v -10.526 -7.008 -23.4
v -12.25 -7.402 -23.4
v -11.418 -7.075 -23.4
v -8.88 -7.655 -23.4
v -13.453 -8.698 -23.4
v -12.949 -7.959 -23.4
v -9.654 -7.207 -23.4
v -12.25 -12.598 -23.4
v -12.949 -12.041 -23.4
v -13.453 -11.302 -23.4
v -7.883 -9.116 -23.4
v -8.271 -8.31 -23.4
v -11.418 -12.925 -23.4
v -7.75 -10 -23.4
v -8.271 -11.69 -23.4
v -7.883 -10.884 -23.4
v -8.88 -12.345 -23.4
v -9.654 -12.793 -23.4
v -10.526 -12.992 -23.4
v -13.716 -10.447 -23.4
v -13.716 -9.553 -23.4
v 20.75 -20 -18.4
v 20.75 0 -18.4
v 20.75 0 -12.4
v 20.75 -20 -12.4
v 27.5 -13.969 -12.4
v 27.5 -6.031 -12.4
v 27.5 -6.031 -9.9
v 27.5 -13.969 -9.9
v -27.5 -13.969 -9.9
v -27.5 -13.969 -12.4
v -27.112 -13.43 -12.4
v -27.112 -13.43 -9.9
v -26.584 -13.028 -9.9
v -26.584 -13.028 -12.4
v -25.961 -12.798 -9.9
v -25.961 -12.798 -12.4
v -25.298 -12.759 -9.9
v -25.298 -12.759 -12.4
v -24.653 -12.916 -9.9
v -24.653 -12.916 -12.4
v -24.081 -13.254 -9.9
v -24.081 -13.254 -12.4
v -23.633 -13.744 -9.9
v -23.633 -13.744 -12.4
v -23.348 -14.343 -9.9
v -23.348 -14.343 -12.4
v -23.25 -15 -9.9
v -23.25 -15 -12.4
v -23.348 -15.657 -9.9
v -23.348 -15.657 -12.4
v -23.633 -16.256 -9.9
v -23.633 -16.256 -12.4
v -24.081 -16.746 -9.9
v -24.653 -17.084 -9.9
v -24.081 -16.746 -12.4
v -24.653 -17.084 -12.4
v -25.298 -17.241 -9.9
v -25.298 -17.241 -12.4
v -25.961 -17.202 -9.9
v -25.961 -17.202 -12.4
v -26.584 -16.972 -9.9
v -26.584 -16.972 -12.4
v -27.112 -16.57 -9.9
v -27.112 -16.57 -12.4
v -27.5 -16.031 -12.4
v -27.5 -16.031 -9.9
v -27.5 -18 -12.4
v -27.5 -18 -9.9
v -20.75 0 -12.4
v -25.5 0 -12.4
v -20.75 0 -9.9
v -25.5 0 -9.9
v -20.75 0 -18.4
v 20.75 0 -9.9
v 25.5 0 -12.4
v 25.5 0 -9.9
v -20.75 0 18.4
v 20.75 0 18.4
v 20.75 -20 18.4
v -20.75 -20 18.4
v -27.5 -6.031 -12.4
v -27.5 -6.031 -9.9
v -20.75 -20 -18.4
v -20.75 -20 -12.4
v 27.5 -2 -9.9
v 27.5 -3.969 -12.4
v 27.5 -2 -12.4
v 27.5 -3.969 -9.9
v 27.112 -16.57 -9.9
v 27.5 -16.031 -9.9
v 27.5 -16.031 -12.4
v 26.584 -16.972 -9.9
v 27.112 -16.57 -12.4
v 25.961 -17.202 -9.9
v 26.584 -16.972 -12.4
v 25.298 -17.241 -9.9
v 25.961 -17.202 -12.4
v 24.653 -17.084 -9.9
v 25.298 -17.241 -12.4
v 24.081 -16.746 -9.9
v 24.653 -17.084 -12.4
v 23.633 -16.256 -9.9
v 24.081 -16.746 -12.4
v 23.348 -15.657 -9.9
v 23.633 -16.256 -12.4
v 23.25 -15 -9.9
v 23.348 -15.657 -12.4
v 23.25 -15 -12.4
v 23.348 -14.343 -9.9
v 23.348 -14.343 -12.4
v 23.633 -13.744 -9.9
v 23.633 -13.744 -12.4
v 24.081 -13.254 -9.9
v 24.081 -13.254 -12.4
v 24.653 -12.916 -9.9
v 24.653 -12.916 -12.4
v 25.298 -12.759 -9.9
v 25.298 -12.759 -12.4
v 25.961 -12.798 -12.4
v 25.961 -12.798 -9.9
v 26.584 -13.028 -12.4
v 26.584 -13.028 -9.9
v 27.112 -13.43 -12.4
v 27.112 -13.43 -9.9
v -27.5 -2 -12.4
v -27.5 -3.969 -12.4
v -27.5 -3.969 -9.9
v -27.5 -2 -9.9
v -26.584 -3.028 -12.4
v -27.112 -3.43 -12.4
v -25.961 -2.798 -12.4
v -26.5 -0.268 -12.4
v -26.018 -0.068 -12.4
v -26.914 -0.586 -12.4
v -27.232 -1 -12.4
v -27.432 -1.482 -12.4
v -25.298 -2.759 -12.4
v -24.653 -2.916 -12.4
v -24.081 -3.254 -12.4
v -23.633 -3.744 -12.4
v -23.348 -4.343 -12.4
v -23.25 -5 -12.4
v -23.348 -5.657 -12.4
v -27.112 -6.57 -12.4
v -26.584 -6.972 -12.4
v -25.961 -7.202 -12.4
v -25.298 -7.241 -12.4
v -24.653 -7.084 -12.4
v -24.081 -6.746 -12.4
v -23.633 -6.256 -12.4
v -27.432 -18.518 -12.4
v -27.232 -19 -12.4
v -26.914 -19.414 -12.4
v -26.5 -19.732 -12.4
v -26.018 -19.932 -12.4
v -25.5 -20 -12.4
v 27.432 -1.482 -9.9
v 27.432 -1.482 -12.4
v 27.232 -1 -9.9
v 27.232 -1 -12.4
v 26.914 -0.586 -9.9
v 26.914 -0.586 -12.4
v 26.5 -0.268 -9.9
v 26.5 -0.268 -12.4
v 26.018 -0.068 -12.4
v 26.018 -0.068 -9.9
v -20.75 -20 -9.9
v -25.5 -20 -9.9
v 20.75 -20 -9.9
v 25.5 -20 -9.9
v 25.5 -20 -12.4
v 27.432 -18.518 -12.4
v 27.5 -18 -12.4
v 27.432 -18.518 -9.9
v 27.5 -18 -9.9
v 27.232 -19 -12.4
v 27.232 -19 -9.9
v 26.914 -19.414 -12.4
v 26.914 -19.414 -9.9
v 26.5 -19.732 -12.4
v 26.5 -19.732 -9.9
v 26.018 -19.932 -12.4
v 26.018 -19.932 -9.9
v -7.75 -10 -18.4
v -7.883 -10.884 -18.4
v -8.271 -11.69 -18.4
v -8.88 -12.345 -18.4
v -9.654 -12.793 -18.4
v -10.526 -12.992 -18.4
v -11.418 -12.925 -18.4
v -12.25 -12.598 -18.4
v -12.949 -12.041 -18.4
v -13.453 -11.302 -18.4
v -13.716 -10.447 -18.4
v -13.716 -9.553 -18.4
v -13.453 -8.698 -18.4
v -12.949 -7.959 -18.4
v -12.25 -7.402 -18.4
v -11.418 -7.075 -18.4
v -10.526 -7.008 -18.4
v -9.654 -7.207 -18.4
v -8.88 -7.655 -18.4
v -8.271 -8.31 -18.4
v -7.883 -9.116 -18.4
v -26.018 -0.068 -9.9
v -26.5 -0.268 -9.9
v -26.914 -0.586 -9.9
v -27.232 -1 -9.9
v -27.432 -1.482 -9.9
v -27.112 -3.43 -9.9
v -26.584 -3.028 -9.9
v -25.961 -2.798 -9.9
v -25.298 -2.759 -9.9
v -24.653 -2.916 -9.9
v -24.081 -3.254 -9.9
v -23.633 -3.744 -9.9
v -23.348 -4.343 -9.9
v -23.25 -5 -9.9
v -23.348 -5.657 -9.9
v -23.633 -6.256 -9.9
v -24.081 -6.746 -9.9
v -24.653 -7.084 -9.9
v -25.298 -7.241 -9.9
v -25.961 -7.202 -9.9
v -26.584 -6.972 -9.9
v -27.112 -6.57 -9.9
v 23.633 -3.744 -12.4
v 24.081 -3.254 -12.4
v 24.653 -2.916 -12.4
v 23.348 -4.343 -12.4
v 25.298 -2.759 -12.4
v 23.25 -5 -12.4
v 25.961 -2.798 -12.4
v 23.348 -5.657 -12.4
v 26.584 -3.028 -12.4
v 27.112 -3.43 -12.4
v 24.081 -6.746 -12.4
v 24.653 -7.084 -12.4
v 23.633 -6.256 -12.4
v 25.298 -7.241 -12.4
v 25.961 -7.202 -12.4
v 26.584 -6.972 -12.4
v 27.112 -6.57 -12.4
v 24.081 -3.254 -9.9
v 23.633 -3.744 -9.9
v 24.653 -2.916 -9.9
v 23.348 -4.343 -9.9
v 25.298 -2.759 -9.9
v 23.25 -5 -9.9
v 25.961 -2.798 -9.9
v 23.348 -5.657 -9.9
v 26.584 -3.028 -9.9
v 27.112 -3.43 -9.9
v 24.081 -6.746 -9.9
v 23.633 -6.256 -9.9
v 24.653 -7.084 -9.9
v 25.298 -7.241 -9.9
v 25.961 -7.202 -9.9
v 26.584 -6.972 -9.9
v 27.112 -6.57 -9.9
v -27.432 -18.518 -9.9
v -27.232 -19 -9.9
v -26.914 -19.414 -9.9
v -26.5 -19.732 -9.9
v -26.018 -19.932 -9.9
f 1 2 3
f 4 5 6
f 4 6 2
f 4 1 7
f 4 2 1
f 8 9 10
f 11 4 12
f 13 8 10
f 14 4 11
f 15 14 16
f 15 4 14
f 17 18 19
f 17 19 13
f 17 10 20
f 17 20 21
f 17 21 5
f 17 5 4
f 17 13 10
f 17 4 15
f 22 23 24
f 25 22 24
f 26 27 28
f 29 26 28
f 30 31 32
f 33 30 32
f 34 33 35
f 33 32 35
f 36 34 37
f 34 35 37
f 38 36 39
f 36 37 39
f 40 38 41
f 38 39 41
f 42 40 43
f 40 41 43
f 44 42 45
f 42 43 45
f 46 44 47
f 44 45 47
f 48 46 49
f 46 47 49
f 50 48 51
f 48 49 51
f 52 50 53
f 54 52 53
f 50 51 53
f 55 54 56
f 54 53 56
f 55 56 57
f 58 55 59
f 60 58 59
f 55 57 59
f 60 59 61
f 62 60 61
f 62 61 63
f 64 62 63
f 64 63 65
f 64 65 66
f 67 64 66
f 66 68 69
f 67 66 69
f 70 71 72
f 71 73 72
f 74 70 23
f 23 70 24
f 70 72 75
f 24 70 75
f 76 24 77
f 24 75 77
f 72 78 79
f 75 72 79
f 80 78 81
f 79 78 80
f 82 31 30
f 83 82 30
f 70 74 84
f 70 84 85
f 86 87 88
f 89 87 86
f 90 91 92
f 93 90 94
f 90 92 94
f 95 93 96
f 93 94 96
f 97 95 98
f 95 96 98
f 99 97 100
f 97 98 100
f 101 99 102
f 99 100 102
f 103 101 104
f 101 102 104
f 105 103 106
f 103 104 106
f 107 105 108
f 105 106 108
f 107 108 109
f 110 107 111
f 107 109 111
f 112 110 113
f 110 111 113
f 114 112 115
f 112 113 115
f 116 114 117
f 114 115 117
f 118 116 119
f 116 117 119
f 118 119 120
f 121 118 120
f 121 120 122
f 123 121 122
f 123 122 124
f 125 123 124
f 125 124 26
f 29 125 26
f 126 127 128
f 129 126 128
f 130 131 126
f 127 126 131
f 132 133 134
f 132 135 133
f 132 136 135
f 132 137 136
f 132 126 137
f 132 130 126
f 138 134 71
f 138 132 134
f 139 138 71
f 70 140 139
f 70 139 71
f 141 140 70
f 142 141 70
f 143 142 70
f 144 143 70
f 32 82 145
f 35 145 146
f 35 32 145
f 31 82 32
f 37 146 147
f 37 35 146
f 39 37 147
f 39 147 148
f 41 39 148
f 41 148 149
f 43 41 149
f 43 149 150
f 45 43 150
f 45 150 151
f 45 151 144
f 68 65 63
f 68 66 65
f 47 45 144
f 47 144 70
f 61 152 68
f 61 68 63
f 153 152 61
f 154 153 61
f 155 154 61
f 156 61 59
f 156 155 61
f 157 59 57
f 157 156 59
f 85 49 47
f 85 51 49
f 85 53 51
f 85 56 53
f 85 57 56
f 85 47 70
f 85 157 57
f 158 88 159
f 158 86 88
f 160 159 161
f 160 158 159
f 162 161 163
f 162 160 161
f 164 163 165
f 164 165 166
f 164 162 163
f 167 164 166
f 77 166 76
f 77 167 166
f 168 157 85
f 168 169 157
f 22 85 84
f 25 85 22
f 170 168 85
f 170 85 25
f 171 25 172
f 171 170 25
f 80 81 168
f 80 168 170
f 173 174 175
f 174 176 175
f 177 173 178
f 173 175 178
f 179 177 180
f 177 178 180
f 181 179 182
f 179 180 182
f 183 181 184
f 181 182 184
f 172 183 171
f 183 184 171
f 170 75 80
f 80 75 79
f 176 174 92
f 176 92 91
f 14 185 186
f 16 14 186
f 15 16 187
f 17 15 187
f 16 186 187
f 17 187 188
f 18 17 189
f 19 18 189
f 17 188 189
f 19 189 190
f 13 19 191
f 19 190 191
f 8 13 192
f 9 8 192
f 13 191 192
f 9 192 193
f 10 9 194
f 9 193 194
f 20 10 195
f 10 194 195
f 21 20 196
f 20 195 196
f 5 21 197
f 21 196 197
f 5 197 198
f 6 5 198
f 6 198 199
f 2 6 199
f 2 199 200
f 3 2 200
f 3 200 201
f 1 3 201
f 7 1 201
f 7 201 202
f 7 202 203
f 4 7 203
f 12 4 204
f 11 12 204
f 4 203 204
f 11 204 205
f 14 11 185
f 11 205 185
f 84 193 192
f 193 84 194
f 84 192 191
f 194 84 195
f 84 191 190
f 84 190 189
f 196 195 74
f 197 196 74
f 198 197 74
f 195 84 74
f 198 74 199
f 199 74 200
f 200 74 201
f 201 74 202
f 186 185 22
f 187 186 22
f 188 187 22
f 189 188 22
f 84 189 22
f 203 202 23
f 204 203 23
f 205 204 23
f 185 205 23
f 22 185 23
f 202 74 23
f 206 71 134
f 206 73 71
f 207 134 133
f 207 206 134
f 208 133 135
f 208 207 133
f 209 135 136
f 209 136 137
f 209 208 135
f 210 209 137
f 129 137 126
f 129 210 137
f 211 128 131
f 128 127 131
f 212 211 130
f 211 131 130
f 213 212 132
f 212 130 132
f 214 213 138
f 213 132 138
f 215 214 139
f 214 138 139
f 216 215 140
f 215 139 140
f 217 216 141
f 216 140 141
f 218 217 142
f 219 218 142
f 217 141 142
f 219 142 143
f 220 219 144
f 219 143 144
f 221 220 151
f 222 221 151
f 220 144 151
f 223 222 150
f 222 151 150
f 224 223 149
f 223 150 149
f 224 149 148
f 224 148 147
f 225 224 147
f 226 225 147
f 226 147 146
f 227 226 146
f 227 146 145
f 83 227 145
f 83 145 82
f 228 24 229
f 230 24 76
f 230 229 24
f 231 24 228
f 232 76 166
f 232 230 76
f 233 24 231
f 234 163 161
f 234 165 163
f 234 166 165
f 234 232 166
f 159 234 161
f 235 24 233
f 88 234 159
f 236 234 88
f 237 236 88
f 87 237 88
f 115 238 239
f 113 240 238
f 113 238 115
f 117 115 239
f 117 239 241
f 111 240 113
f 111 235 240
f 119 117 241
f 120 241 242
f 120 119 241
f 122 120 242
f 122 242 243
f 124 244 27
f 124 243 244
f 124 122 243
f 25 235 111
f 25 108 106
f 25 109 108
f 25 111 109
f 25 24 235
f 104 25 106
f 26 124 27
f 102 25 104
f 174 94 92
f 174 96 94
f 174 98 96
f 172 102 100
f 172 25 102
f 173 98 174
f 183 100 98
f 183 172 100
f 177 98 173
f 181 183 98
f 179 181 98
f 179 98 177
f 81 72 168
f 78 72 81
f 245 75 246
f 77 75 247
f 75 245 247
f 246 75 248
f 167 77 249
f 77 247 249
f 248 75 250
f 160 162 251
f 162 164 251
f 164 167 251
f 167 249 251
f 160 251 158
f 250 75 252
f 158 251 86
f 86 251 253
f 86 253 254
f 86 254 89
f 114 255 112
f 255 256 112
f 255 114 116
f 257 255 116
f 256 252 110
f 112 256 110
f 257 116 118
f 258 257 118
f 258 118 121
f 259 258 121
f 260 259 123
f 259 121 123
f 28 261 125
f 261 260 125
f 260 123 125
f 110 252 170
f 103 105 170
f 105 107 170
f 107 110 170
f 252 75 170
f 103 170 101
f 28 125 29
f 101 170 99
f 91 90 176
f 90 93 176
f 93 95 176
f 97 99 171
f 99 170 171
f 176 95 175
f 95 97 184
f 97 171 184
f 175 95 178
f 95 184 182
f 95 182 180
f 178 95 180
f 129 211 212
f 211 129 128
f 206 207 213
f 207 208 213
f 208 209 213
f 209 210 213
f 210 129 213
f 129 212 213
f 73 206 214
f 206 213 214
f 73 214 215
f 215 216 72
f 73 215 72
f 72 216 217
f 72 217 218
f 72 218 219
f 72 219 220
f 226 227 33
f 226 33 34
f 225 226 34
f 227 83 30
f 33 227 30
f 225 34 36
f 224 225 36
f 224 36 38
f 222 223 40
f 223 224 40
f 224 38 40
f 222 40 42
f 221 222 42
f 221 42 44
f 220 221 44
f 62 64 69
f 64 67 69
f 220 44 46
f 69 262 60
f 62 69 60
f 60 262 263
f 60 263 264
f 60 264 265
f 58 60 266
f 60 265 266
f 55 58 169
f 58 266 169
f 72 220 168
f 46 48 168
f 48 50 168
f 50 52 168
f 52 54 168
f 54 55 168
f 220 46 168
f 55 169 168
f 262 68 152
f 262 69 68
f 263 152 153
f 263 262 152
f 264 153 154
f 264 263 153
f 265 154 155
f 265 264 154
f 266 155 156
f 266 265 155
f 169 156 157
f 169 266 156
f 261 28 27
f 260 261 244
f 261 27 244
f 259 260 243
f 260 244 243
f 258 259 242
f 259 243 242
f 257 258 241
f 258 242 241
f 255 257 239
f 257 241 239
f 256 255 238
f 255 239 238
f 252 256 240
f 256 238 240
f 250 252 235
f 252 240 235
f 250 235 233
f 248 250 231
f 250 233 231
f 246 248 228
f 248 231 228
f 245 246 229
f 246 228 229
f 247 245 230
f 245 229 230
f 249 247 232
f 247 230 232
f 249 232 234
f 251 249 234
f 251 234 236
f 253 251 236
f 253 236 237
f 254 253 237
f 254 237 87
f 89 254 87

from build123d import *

# Parameters (mm, degrees)
F0_W     = 41.5
F0_H     = 36.8
F1_DEPTH = 20
F2_W     = 55
F2_H     = 2.5
F3_DEPTH = 20
F4_R     = 3
F5_DEPTH = 5
F6_R     = 2.25
F7_DEPTH = 25
F8_R     = 2


with BuildPart() as f1:
    # F0 (on Front) → F1 (new body)
    with BuildSketch(Plane.XZ):
        Rectangle(F0_W, F0_H)
    extrude(amount=F1_DEPTH)

    # F2 (on face) → F3 (join)
    with BuildSketch(Plane.XZ.offset(20)):
        with Locations((0, -11.15)):
            Rectangle(F2_W, F2_H)
    extrude(amount=-F3_DEPTH)

    # F4 (on face) → F5 (join)
    with BuildSketch(Plane(origin=(0, 0, -18.4), x_dir=(1, 0, 0), z_dir=(0, 0, -1))):
        with Locations((-10.75, 10)):
            Circle(F4_R)
    extrude(amount=F5_DEPTH)

    # F6 (on face) → F7 (cut)
    with BuildSketch(Plane(origin=(0, 0, -12.4), x_dir=(1, 0, 0), z_dir=(0, 0, -1))):
        with Locations((-25.5, 15)):
            Circle(F6_R)
        with Locations((-25.5, 5)):
            Circle(F6_R)
        with Locations((25.5, 15)):
            Circle(F6_R)
        with Locations((25.5, 5)):
            Circle(F6_R)
    extrude(amount=-F7_DEPTH, mode=Mode.SUBTRACT)

    # F8
    f8_edges = [f1.edges().sort_by_distance(p)[0] for p in [
        (27.5, -20, -11.15),
        (27.5, 0, -11.15),
        (-27.5, -20, -11.15),
        (-27.5, 0, -11.15),
    ]]
    fillet(f8_edges, radius=F8_R)


solid = f1.part
